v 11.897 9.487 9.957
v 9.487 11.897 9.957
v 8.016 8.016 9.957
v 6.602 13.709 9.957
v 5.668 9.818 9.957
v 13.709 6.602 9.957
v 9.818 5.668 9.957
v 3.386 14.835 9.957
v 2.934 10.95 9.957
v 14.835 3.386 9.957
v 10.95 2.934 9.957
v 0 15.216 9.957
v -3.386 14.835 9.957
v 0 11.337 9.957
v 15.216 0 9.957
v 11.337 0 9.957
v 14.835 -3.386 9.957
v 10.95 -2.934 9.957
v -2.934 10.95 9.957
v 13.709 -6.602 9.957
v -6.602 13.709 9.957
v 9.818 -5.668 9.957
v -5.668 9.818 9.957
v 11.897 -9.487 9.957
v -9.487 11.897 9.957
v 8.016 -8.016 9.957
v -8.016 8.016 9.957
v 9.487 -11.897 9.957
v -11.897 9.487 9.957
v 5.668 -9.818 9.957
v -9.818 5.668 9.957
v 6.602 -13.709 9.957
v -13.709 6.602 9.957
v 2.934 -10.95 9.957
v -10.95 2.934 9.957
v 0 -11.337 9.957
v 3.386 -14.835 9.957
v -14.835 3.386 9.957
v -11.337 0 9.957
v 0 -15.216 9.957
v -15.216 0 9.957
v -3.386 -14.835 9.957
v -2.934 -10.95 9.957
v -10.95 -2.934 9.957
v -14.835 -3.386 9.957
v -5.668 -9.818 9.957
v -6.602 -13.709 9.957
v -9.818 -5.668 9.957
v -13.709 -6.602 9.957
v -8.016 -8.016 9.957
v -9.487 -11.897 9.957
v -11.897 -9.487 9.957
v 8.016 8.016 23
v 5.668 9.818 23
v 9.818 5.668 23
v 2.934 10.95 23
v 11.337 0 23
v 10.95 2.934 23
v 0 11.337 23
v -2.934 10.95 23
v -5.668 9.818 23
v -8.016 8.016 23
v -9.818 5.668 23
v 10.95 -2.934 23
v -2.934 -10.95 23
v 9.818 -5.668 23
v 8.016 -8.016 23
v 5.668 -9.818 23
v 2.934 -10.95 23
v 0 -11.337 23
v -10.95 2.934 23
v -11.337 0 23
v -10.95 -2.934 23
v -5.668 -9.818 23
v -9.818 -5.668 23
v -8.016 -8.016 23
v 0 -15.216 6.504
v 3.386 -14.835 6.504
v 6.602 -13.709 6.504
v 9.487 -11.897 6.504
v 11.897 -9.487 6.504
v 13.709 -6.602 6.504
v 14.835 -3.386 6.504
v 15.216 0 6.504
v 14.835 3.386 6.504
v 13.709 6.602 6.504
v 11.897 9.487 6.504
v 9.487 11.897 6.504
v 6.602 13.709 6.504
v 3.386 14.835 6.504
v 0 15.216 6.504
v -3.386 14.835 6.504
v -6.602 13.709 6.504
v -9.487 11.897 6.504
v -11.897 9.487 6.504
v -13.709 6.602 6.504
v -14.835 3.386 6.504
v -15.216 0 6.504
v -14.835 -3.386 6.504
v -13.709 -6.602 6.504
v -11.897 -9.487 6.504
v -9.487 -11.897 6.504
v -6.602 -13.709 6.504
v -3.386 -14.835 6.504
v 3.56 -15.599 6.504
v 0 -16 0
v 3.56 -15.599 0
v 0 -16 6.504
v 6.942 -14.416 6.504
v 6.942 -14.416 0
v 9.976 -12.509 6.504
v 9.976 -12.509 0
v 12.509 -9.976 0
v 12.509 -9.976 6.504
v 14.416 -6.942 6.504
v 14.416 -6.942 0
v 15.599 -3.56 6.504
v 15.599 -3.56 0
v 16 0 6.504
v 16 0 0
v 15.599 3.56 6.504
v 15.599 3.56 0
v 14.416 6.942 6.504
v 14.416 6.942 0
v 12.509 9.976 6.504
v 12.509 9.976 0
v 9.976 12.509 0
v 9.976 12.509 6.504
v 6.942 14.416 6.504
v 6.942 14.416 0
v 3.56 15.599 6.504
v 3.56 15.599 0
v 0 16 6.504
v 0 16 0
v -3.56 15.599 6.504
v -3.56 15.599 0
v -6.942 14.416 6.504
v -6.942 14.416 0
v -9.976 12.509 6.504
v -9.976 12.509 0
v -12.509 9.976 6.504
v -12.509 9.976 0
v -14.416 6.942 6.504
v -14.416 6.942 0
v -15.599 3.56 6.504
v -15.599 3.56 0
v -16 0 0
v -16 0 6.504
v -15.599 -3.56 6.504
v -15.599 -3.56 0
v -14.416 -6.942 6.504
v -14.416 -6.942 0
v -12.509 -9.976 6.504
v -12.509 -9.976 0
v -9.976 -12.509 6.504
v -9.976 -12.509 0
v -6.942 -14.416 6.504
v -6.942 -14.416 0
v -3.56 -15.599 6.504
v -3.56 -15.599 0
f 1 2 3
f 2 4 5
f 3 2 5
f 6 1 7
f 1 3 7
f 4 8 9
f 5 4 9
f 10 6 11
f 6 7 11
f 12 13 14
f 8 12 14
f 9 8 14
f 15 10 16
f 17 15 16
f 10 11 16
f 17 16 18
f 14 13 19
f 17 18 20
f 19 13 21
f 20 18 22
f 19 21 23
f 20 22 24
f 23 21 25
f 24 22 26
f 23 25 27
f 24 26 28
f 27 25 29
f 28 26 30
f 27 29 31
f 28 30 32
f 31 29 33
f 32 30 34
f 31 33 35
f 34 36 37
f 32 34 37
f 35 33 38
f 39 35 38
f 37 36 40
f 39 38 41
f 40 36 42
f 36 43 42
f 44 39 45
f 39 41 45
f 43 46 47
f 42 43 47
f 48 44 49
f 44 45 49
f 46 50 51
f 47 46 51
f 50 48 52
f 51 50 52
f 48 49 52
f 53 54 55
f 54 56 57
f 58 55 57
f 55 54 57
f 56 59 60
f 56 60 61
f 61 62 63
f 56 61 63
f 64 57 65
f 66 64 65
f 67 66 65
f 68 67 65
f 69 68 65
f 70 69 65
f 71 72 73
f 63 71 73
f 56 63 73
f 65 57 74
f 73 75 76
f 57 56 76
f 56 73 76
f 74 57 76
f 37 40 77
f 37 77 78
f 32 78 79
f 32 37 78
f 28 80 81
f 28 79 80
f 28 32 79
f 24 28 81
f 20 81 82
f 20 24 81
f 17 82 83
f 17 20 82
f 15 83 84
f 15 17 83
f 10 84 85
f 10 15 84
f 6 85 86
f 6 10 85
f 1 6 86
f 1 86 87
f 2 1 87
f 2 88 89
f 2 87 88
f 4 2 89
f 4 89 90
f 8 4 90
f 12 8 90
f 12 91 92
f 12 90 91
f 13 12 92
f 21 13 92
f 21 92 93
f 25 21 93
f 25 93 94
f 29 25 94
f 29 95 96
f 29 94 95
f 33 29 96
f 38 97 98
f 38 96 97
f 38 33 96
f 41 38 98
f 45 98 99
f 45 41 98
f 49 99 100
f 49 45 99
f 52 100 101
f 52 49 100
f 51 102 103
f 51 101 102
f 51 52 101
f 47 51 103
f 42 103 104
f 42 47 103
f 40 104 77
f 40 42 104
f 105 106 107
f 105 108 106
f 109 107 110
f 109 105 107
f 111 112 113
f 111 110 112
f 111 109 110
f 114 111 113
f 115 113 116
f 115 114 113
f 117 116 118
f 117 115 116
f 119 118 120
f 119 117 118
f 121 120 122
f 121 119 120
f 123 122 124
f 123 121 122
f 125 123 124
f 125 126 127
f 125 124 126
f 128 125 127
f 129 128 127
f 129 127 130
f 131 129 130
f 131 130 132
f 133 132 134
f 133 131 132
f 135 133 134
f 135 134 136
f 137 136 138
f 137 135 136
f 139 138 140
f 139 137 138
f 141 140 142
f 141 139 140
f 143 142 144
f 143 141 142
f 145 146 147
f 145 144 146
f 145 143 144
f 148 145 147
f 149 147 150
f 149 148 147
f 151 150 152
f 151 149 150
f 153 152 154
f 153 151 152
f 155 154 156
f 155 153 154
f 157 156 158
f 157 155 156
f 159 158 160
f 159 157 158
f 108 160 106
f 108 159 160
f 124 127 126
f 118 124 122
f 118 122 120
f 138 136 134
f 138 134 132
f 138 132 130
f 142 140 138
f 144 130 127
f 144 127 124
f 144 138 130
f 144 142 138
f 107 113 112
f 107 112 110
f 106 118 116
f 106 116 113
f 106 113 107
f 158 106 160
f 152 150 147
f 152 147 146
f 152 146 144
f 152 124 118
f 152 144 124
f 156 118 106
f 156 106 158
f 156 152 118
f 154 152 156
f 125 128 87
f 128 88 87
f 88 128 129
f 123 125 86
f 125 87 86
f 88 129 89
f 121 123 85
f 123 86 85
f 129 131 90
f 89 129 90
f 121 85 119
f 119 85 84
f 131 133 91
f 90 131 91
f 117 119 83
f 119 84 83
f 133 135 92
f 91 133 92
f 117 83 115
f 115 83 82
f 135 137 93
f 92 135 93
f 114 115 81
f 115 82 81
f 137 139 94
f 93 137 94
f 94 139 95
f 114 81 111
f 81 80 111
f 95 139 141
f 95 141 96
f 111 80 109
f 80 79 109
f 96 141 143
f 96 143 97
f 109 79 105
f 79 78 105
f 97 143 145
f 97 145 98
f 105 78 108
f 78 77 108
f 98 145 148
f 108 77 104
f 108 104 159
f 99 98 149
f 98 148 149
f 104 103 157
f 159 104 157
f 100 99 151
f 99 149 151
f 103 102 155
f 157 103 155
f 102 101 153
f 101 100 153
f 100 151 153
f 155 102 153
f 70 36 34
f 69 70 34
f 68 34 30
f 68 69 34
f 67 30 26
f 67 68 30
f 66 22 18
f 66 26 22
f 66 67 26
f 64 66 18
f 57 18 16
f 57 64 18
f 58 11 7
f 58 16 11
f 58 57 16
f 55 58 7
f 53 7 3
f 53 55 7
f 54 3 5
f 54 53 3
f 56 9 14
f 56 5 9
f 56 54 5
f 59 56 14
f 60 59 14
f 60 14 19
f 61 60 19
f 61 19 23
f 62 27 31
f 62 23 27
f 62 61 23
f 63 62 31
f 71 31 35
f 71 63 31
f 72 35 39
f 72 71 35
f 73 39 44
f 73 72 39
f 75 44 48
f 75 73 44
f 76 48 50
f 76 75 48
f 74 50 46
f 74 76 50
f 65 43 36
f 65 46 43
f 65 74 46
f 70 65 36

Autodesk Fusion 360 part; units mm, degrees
sketch "Esquisse1" plane through (0, 0, 0) normal (1, 0, 0) x (0, 1, 0)
  line L0 (0, 0) -> (-16, 0)
  line L1 (-16, 0) -> (-16, 6.5037)
  line L2 (-16, 6.5037) -> (-15.2163, 6.5037)
  line L3 (-15.2163, 6.5037) -> (-15.2163, 9.9566)
  line L4 (-15.2163, 9.9566) -> (-11.3366, 9.9566)
  line L5 (-11.3366, 9.9566) -> (-11.3366, 23)
  line L6 (-11.3366, 23) -> (0, 23)
  line L7 (0, 23) -> (0, 0)
  line L8 (0, 2.5) -> (0, 20)
  dimension "d1" = 16
  dimension "d2" = 15.2163
revolve "Révolution1" add sketch "Esquisse1" angle 360 about axis through (0, 0, 23) along (0, 0, -1)
